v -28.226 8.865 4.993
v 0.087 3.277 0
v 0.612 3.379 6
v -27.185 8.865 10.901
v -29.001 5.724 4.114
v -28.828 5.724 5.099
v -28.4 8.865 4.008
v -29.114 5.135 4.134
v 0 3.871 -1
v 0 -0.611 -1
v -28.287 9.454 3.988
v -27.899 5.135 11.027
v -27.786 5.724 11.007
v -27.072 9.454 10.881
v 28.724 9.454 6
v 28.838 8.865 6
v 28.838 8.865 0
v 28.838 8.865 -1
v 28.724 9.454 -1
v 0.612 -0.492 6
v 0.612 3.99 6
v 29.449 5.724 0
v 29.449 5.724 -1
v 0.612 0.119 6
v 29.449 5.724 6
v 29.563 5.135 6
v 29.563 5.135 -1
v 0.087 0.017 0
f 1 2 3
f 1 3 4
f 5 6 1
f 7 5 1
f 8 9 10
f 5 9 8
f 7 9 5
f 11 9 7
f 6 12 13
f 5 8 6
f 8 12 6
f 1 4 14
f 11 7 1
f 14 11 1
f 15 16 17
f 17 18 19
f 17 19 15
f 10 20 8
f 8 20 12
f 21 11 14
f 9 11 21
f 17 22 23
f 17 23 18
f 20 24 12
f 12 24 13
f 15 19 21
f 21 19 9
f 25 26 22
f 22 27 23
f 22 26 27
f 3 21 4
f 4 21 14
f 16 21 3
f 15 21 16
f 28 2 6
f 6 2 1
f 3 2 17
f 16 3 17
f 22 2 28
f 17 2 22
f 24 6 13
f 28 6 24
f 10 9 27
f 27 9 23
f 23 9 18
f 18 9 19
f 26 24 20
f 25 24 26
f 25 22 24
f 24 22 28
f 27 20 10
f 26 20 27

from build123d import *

# Parameters (mm, degrees)
F1_DEPTH = 1
F2_DEPTH = 6
F5_DEPTH = 25
F8_DEPTH = 19.4554531584


with BuildPart() as f1:
    # F0 (on Top) → F1 (new body)
    with BuildSketch(Plane.XY):
        Polygon((-29.4488155034, 5.7242698613), (0, 0), (29.4488155034, 5.7242698613), (28.8382267182, 8.8654768483), (0, 3.2598934239), (-28.8382267182, 8.8654768483), align=None)
        Polygon((29.4488155034, 5.7242698613), (0, 0), (-29.4488155034, 5.7242698613), (-29.5633009007, 5.1352935512), (0, -0.611230017), (29.5633009007, 5.1352935512), align=None)
        Polygon((0, 3.2598934239), (28.8382267182, 8.8654768483), (28.723741321, 9.4544531584), (0, 3.8711234408), (-28.723741321, 9.4544531584), (-28.8382267182, 8.8654768483), align=None)
    extrude(amount=-F1_DEPTH)

    # F0 (on Top) → F2 (join)
    with BuildSketch(Plane.XY):
        Polygon((0, 3.2598934239), (28.8382267182, 8.8654768483), (28.723741321, 9.4544531584), (0, 3.8711234408), (-28.723741321, 9.4544531584), (-28.8382267182, 8.8654768483), align=None)
        Polygon((29.4488155034, 5.7242698613), (0, 0), (-29.4488155034, 5.7242698613), (-29.5633009007, 5.1352935512), (0, -0.611230017), (29.5633009007, 5.1352935512), align=None)
    extrude(amount=F2_DEPTH)

    # F4 (on face) → F5 (cut)
    with BuildSketch(Plane(origin=(0.7250741824, 3.7301832971, 0), x_dir=(-0.9816271834, 0.1908089954, 0), z_dir=(0.1908089954, 0.9816271834, 0))):
        Polygon((30, 2), (30, 6), (8.7386451747, 6), align=None)
    extrude(amount=-F5_DEPTH, mode=Mode.SUBTRACT)

    # F7 (on offset) → F8 (cut, through all)
    with BuildSketch(Plane.XZ.offset(10)):
        Polygon((-30.2472151816, -2.2539433558), (0, -2.2539433558), (0, -1), (0, 10.581173934), (-30.2472151816, 10.581173934), align=None)
        Polygon((0, 10.581173934), (0, -1), (1.0596845285, 11.1122495846), align=None)
    extrude(amount=-F8_DEPTH, mode=Mode.SUBTRACT)

    # F10: F1 across plane


with BuildPart() as f1_1:
    add(f1.part)
    add(f1.part.mirror(Plane(origin=(0.2338059111, 1.6753939772, 1.6724137931), x_dir=(0, -1, 0), z_dir=(-0.9961946981, 0, 0.0871557427))))


solid = f1_1.part
